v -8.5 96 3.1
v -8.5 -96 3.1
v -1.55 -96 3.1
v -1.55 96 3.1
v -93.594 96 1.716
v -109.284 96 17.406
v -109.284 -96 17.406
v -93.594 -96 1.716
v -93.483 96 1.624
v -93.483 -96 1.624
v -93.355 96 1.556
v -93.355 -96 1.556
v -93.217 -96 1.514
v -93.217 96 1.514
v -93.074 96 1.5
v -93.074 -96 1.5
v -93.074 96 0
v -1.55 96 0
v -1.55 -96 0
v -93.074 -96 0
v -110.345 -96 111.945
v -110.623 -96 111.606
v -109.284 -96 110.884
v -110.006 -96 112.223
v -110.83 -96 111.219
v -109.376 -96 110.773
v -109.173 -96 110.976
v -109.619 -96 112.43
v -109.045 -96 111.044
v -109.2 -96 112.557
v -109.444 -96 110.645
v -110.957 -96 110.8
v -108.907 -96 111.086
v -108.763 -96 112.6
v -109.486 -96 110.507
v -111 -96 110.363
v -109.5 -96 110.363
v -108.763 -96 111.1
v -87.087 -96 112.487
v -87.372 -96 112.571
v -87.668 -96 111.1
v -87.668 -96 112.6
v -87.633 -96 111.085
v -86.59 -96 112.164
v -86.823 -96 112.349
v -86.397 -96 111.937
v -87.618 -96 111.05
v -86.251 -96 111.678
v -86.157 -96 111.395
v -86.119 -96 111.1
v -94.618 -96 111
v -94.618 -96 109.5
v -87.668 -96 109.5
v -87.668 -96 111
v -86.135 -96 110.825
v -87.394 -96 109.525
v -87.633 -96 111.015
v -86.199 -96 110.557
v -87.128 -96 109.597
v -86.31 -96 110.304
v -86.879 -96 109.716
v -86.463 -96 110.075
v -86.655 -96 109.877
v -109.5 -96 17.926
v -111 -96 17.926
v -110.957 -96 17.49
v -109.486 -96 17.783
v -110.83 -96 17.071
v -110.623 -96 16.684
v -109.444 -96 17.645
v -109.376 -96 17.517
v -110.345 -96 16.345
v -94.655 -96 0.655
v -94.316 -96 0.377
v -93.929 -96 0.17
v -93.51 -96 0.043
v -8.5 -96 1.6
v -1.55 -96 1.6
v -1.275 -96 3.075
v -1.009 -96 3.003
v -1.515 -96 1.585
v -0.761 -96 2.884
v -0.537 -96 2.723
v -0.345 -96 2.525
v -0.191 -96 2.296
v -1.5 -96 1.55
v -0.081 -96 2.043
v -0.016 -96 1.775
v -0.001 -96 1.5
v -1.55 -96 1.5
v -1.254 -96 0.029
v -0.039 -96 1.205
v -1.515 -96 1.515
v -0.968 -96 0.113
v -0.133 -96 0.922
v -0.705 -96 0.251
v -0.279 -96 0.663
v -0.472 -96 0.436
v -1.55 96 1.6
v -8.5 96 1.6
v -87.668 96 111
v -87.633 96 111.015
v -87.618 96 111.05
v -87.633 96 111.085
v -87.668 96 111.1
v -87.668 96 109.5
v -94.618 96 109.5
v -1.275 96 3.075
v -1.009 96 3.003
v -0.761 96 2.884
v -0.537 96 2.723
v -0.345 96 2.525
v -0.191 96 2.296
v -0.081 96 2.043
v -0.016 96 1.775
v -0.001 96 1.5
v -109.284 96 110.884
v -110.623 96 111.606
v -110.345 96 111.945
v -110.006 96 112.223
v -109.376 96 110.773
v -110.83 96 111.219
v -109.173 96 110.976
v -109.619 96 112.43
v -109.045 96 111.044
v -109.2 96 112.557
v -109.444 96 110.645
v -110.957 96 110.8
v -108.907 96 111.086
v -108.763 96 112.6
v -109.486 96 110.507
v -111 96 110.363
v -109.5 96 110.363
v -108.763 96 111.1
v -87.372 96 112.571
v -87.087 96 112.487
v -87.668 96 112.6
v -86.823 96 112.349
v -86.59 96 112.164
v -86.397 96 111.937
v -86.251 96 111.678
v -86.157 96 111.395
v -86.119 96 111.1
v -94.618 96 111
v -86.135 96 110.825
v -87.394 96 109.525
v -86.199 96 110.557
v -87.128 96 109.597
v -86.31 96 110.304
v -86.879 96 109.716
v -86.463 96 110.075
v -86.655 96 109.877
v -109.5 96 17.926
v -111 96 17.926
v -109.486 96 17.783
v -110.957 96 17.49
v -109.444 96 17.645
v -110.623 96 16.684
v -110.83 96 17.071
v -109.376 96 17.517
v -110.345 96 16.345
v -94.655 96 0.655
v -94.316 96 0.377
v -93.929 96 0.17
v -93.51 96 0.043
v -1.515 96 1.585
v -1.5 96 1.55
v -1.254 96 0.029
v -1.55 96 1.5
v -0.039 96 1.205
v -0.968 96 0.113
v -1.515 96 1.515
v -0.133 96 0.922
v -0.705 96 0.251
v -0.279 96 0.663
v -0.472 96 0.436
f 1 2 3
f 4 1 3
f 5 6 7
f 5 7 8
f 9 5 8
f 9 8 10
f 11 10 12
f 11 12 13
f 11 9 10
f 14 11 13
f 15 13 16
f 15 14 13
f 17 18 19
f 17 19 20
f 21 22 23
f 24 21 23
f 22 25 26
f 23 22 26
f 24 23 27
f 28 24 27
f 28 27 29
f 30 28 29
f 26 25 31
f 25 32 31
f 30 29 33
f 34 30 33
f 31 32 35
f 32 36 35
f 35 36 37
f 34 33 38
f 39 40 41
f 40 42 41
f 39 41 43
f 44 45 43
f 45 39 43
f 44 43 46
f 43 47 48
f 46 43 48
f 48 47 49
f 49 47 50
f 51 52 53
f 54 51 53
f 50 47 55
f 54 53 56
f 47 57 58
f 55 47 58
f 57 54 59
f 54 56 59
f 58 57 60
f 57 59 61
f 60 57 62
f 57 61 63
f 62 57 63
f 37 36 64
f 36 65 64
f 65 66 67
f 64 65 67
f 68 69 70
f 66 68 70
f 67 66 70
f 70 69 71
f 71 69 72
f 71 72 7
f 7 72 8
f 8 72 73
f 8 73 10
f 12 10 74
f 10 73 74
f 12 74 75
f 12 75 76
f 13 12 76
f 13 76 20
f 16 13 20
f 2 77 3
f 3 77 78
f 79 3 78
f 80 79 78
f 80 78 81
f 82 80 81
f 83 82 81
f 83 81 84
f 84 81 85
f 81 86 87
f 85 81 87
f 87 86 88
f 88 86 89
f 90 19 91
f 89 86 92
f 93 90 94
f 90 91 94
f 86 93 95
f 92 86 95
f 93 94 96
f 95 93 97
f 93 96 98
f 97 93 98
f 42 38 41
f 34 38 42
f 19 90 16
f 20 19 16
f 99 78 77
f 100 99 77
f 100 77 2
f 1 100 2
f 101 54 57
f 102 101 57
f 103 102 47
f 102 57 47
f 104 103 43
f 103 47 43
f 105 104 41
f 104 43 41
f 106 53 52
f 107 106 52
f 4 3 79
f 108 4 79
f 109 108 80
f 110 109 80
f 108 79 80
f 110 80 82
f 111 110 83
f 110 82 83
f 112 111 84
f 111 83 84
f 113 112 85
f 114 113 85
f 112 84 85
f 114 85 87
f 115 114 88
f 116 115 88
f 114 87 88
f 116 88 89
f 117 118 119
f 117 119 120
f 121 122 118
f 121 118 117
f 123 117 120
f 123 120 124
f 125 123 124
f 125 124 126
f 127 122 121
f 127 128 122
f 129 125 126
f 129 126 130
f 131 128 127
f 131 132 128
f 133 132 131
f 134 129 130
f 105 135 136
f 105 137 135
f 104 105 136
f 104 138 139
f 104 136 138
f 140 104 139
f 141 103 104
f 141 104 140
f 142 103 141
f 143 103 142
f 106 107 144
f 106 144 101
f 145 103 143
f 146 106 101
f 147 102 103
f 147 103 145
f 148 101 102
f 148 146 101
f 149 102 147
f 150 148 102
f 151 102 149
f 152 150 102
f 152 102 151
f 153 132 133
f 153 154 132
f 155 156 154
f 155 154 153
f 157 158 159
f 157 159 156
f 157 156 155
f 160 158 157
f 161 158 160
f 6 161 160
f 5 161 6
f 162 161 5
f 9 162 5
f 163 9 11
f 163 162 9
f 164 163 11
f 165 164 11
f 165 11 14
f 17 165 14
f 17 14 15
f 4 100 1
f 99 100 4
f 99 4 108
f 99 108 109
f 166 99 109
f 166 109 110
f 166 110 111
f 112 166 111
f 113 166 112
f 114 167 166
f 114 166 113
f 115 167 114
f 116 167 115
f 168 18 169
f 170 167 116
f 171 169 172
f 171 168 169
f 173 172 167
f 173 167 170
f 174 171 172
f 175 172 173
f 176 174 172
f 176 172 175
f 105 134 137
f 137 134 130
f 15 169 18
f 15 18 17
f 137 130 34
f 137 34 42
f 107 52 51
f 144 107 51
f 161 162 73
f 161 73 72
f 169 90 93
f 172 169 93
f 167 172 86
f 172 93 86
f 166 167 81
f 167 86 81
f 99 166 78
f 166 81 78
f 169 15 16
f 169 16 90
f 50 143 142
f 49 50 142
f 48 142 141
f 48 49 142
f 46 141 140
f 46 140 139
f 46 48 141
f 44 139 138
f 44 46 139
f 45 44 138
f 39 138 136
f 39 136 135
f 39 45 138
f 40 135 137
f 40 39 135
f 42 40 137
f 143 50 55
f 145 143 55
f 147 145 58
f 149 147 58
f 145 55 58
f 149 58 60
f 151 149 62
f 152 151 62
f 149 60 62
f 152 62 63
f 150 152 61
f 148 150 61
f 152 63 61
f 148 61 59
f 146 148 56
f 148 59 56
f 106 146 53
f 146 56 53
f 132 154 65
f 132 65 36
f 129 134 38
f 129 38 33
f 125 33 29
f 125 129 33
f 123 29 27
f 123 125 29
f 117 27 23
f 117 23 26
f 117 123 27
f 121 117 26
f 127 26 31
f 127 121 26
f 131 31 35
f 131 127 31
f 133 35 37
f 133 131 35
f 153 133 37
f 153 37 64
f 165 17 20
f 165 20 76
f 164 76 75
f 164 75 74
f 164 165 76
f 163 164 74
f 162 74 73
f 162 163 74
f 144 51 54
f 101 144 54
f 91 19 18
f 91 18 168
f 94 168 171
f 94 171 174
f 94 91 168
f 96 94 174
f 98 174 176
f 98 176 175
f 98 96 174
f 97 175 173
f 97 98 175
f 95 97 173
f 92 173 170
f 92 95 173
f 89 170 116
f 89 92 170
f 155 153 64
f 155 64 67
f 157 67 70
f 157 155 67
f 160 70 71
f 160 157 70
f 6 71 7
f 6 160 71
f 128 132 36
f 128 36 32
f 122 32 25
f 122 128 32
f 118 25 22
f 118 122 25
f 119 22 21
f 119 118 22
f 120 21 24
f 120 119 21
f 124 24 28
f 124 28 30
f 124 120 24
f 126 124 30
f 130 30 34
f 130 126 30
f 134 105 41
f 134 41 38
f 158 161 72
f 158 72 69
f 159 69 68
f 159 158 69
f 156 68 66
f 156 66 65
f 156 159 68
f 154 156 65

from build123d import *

# Parameters (mm, degrees)
BASE_FLANGE1_DEPTH = 96
HEM1_START         = -96
HEM1_DEPTH         = 192
HEM1_2_DEPTH       = 192


# Read off the part's stored shape, not the designer's step: Hem1
# Sheet-metal steps are written as plain solids
with BuildPart() as part:
    # Sketch1 → Base-Flange1 (new, symmetric)
    with BuildSketch(Plane(origin=(0, 0, 0), x_dir=(-1, 0, 0), z_dir=(0, 1, 0))):
        with BuildLine():
            Line((0, 0), (93.073569946, 0))
            ThreePointArc((93.073569946, 0), (93.929479711, 0.170251038), (94.655084973, 0.655084973))
            Line((94.655084973, 0.655084973), (110.344915027, 16.344915027))
            ThreePointArc((110.344915027, 16.344915027), (110.829748962, 17.070520289), (111, 17.926430054))
            Line((111, 17.926430054), (111, 110.3634))
            ThreePointArc((111, 110.3634), (110.344915027, 111.944915027), (108.7634, 112.6))
            Line((108.7634, 112.6), (86.118343195, 112.6))
            Line((86.118343195, 112.6), (86.118343195, 111.1))
            Line((86.118343195, 111.1), (108.7634, 111.1))
            ThreePointArc((108.7634, 111.1), (109.284254855, 110.884254855), (109.5, 110.3634))
            Line((109.5, 110.3634), (109.5, 17.926430054))
            ThreePointArc((109.5, 17.926430054), (109.443929664, 17.644545437), (109.284254855, 17.405575199))
            Line((109.284254855, 17.405575199), (93.594424801, 1.715745145))
            ThreePointArc((93.594424801, 1.715745145), (93.355454563, 1.556070336), (93.073569946, 1.5))
            Line((93.073569946, 1.5), (0, 1.5))
            Line((0, 1.5), (0, 0))
        make_face()
    extrude(amount=BASE_FLANGE1_DEPTH, both=True)

    # Hem1 outline → Hem1 (cut)
    with BuildSketch(Plane(origin=(0, 0, 0), x_dir=(1, 0, 0), z_dir=(0, 1, 0)).offset(HEM1_START)):
        with BuildLine():
            Line((-86.118343195, -111.1), (-86.119149857, -111.1))
            ThreePointArc((-86.119149857, -111.1), (-86.590150262, -112.163552873), (-87.668343195, -112.6))
            Line((-87.668343195, -112.6), (-86.118343195, -112.6))
            Line((-86.118343195, -112.6), (-86.118343195, -111.1))
        make_face()
        with BuildLine():
            ThreePointArc((-1.55, 0), (-0.471807067, -0.436447127), (-0.000806662, -1.5))
            Line((-0.000806662, -1.5), (0, -1.5))
            Line((0, -1.5), (0, 0))
            Line((0, 0), (-1.55, 0))
        make_face()
    extrude(amount=HEM1_DEPTH, mode=Mode.SUBTRACT)

    # Hem1 2 outline → Hem1 2 (add)
    with BuildSketch(Plane(origin=(0, 0, 0), x_dir=(1, 0, 0), z_dir=(0, 1, 0)).offset(HEM1_START)):
        with BuildLine():
            Line((-94.618343195, -109.5), (-94.618343195, -111))
            Line((-94.618343195, -111), (-87.668343195, -111))
            ThreePointArc((-87.668343195, -111), (-87.618343195, -111.05), (-87.668343195, -111.1))
            Line((-87.668343195, -111.1), (-86.119149857, -111.1))
            ThreePointArc((-86.119149857, -111.1), (-86.554790322, -109.971807067), (-87.668343195, -109.5))
            Line((-87.668343195, -109.5), (-94.618343195, -109.5))
        make_face()
        with BuildLine():
            Line((-8.5, -1.6), (-8.5, -3.1))
            Line((-8.5, -3.1), (-1.55, -3.1))
            ThreePointArc((-1.55, -3.1), (-0.436447127, -2.628192933), (-0.000806662, -1.5))
            Line((-0.000806662, -1.5), (-1.55, -1.5))
            ThreePointArc((-1.55, -1.5), (-1.5, -1.55), (-1.55, -1.6))
            Line((-1.55, -1.6), (-8.5, -1.6))
        make_face()
    extrude(amount=HEM1_2_DEPTH)


solid = part.part
